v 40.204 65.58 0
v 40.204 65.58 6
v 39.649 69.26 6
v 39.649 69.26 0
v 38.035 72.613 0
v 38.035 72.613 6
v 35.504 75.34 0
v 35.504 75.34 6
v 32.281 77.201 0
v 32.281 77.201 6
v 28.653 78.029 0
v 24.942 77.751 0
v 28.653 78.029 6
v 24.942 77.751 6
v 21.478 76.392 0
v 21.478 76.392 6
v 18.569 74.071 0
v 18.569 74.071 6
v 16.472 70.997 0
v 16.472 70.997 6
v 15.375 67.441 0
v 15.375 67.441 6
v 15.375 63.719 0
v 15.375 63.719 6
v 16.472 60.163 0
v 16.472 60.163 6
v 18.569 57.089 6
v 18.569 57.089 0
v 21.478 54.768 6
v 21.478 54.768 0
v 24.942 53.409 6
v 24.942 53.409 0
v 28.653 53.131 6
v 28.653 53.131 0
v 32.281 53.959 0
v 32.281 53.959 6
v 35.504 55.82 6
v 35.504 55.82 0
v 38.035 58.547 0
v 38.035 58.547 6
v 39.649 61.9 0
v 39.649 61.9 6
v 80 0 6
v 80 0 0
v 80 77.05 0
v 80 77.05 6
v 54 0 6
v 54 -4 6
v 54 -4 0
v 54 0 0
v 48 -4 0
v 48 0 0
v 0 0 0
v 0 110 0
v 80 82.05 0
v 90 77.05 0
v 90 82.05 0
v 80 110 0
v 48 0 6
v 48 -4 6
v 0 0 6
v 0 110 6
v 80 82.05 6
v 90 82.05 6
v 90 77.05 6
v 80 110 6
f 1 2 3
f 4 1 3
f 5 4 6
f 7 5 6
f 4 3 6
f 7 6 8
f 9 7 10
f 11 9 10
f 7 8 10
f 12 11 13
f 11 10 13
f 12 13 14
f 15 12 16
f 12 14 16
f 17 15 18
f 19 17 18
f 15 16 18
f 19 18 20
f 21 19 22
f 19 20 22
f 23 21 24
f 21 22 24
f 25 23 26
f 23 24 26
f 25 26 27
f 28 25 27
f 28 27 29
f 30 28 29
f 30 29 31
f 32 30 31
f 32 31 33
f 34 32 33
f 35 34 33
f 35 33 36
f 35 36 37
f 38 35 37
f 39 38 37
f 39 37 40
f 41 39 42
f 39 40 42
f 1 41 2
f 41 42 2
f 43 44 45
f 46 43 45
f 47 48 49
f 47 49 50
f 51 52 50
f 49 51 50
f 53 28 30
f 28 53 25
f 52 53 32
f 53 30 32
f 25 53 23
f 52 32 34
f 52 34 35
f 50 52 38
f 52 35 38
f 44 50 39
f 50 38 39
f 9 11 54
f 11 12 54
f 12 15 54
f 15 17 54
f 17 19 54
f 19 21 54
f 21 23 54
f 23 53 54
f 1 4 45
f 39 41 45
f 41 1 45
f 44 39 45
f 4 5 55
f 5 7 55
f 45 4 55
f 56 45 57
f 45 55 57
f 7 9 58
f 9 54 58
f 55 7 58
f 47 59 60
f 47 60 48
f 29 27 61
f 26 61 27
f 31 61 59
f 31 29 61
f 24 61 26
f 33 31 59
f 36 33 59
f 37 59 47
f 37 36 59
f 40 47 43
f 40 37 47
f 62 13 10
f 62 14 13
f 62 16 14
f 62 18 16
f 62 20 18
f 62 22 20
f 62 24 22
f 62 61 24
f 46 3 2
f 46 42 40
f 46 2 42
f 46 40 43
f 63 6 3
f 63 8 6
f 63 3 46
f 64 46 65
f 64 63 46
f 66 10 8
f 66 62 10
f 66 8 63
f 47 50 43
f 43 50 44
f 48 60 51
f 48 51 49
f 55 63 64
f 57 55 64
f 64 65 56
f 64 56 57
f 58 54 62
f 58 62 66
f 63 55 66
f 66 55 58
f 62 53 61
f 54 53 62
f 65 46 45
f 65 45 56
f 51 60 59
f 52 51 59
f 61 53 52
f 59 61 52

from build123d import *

# Parameters (mm, degrees)
SKETCH3_W           = 80
SKETCH3_H           = 110
BOSS_EXTRUDE1_DEPTH = 6
SKETCH4_W           = 6
SKETCH4_H           = 4
BOSS_EXTRUDE2_DEPTH = 6
SKETCH6_W           = 10
SKETCH6_H           = 5
BOSS_EXTRUDE3_DEPTH = 6
SKETCH8_R           = 12.4841
CUT_EXTRUDE1_DEPTH  = 6


with BuildPart() as part:
    # Sketch3 → Boss-Extrude1 (new body)
    with BuildSketch(Plane.XY):
        with Locations((40, 55)):
            Rectangle(SKETCH3_W, SKETCH3_H)
    extrude(amount=BOSS_EXTRUDE1_DEPTH)

    # Sketch4 → Boss-Extrude2 (add)
    with BuildSketch(Plane.XY.offset(6)):
        with Locations((51, -2)):
            Rectangle(SKETCH4_W, SKETCH4_H)
    extrude(amount=-BOSS_EXTRUDE2_DEPTH)

    # Sketch6 → Boss-Extrude3 (add)
    with BuildSketch(Plane.XY.offset(6)):
        with Locations((85, 79.55)):
            Rectangle(SKETCH6_W, SKETCH6_H)
    extrude(amount=-BOSS_EXTRUDE3_DEPTH)

    # Sketch8 → Cut-Extrude1 (cut)
    with BuildSketch(Plane.XY.offset(6)):
        with Locations((27.72, 65.58)):
            Circle(SKETCH8_R)
    extrude(amount=-CUT_EXTRUDE1_DEPTH, mode=Mode.SUBTRACT)


solid = part.part
